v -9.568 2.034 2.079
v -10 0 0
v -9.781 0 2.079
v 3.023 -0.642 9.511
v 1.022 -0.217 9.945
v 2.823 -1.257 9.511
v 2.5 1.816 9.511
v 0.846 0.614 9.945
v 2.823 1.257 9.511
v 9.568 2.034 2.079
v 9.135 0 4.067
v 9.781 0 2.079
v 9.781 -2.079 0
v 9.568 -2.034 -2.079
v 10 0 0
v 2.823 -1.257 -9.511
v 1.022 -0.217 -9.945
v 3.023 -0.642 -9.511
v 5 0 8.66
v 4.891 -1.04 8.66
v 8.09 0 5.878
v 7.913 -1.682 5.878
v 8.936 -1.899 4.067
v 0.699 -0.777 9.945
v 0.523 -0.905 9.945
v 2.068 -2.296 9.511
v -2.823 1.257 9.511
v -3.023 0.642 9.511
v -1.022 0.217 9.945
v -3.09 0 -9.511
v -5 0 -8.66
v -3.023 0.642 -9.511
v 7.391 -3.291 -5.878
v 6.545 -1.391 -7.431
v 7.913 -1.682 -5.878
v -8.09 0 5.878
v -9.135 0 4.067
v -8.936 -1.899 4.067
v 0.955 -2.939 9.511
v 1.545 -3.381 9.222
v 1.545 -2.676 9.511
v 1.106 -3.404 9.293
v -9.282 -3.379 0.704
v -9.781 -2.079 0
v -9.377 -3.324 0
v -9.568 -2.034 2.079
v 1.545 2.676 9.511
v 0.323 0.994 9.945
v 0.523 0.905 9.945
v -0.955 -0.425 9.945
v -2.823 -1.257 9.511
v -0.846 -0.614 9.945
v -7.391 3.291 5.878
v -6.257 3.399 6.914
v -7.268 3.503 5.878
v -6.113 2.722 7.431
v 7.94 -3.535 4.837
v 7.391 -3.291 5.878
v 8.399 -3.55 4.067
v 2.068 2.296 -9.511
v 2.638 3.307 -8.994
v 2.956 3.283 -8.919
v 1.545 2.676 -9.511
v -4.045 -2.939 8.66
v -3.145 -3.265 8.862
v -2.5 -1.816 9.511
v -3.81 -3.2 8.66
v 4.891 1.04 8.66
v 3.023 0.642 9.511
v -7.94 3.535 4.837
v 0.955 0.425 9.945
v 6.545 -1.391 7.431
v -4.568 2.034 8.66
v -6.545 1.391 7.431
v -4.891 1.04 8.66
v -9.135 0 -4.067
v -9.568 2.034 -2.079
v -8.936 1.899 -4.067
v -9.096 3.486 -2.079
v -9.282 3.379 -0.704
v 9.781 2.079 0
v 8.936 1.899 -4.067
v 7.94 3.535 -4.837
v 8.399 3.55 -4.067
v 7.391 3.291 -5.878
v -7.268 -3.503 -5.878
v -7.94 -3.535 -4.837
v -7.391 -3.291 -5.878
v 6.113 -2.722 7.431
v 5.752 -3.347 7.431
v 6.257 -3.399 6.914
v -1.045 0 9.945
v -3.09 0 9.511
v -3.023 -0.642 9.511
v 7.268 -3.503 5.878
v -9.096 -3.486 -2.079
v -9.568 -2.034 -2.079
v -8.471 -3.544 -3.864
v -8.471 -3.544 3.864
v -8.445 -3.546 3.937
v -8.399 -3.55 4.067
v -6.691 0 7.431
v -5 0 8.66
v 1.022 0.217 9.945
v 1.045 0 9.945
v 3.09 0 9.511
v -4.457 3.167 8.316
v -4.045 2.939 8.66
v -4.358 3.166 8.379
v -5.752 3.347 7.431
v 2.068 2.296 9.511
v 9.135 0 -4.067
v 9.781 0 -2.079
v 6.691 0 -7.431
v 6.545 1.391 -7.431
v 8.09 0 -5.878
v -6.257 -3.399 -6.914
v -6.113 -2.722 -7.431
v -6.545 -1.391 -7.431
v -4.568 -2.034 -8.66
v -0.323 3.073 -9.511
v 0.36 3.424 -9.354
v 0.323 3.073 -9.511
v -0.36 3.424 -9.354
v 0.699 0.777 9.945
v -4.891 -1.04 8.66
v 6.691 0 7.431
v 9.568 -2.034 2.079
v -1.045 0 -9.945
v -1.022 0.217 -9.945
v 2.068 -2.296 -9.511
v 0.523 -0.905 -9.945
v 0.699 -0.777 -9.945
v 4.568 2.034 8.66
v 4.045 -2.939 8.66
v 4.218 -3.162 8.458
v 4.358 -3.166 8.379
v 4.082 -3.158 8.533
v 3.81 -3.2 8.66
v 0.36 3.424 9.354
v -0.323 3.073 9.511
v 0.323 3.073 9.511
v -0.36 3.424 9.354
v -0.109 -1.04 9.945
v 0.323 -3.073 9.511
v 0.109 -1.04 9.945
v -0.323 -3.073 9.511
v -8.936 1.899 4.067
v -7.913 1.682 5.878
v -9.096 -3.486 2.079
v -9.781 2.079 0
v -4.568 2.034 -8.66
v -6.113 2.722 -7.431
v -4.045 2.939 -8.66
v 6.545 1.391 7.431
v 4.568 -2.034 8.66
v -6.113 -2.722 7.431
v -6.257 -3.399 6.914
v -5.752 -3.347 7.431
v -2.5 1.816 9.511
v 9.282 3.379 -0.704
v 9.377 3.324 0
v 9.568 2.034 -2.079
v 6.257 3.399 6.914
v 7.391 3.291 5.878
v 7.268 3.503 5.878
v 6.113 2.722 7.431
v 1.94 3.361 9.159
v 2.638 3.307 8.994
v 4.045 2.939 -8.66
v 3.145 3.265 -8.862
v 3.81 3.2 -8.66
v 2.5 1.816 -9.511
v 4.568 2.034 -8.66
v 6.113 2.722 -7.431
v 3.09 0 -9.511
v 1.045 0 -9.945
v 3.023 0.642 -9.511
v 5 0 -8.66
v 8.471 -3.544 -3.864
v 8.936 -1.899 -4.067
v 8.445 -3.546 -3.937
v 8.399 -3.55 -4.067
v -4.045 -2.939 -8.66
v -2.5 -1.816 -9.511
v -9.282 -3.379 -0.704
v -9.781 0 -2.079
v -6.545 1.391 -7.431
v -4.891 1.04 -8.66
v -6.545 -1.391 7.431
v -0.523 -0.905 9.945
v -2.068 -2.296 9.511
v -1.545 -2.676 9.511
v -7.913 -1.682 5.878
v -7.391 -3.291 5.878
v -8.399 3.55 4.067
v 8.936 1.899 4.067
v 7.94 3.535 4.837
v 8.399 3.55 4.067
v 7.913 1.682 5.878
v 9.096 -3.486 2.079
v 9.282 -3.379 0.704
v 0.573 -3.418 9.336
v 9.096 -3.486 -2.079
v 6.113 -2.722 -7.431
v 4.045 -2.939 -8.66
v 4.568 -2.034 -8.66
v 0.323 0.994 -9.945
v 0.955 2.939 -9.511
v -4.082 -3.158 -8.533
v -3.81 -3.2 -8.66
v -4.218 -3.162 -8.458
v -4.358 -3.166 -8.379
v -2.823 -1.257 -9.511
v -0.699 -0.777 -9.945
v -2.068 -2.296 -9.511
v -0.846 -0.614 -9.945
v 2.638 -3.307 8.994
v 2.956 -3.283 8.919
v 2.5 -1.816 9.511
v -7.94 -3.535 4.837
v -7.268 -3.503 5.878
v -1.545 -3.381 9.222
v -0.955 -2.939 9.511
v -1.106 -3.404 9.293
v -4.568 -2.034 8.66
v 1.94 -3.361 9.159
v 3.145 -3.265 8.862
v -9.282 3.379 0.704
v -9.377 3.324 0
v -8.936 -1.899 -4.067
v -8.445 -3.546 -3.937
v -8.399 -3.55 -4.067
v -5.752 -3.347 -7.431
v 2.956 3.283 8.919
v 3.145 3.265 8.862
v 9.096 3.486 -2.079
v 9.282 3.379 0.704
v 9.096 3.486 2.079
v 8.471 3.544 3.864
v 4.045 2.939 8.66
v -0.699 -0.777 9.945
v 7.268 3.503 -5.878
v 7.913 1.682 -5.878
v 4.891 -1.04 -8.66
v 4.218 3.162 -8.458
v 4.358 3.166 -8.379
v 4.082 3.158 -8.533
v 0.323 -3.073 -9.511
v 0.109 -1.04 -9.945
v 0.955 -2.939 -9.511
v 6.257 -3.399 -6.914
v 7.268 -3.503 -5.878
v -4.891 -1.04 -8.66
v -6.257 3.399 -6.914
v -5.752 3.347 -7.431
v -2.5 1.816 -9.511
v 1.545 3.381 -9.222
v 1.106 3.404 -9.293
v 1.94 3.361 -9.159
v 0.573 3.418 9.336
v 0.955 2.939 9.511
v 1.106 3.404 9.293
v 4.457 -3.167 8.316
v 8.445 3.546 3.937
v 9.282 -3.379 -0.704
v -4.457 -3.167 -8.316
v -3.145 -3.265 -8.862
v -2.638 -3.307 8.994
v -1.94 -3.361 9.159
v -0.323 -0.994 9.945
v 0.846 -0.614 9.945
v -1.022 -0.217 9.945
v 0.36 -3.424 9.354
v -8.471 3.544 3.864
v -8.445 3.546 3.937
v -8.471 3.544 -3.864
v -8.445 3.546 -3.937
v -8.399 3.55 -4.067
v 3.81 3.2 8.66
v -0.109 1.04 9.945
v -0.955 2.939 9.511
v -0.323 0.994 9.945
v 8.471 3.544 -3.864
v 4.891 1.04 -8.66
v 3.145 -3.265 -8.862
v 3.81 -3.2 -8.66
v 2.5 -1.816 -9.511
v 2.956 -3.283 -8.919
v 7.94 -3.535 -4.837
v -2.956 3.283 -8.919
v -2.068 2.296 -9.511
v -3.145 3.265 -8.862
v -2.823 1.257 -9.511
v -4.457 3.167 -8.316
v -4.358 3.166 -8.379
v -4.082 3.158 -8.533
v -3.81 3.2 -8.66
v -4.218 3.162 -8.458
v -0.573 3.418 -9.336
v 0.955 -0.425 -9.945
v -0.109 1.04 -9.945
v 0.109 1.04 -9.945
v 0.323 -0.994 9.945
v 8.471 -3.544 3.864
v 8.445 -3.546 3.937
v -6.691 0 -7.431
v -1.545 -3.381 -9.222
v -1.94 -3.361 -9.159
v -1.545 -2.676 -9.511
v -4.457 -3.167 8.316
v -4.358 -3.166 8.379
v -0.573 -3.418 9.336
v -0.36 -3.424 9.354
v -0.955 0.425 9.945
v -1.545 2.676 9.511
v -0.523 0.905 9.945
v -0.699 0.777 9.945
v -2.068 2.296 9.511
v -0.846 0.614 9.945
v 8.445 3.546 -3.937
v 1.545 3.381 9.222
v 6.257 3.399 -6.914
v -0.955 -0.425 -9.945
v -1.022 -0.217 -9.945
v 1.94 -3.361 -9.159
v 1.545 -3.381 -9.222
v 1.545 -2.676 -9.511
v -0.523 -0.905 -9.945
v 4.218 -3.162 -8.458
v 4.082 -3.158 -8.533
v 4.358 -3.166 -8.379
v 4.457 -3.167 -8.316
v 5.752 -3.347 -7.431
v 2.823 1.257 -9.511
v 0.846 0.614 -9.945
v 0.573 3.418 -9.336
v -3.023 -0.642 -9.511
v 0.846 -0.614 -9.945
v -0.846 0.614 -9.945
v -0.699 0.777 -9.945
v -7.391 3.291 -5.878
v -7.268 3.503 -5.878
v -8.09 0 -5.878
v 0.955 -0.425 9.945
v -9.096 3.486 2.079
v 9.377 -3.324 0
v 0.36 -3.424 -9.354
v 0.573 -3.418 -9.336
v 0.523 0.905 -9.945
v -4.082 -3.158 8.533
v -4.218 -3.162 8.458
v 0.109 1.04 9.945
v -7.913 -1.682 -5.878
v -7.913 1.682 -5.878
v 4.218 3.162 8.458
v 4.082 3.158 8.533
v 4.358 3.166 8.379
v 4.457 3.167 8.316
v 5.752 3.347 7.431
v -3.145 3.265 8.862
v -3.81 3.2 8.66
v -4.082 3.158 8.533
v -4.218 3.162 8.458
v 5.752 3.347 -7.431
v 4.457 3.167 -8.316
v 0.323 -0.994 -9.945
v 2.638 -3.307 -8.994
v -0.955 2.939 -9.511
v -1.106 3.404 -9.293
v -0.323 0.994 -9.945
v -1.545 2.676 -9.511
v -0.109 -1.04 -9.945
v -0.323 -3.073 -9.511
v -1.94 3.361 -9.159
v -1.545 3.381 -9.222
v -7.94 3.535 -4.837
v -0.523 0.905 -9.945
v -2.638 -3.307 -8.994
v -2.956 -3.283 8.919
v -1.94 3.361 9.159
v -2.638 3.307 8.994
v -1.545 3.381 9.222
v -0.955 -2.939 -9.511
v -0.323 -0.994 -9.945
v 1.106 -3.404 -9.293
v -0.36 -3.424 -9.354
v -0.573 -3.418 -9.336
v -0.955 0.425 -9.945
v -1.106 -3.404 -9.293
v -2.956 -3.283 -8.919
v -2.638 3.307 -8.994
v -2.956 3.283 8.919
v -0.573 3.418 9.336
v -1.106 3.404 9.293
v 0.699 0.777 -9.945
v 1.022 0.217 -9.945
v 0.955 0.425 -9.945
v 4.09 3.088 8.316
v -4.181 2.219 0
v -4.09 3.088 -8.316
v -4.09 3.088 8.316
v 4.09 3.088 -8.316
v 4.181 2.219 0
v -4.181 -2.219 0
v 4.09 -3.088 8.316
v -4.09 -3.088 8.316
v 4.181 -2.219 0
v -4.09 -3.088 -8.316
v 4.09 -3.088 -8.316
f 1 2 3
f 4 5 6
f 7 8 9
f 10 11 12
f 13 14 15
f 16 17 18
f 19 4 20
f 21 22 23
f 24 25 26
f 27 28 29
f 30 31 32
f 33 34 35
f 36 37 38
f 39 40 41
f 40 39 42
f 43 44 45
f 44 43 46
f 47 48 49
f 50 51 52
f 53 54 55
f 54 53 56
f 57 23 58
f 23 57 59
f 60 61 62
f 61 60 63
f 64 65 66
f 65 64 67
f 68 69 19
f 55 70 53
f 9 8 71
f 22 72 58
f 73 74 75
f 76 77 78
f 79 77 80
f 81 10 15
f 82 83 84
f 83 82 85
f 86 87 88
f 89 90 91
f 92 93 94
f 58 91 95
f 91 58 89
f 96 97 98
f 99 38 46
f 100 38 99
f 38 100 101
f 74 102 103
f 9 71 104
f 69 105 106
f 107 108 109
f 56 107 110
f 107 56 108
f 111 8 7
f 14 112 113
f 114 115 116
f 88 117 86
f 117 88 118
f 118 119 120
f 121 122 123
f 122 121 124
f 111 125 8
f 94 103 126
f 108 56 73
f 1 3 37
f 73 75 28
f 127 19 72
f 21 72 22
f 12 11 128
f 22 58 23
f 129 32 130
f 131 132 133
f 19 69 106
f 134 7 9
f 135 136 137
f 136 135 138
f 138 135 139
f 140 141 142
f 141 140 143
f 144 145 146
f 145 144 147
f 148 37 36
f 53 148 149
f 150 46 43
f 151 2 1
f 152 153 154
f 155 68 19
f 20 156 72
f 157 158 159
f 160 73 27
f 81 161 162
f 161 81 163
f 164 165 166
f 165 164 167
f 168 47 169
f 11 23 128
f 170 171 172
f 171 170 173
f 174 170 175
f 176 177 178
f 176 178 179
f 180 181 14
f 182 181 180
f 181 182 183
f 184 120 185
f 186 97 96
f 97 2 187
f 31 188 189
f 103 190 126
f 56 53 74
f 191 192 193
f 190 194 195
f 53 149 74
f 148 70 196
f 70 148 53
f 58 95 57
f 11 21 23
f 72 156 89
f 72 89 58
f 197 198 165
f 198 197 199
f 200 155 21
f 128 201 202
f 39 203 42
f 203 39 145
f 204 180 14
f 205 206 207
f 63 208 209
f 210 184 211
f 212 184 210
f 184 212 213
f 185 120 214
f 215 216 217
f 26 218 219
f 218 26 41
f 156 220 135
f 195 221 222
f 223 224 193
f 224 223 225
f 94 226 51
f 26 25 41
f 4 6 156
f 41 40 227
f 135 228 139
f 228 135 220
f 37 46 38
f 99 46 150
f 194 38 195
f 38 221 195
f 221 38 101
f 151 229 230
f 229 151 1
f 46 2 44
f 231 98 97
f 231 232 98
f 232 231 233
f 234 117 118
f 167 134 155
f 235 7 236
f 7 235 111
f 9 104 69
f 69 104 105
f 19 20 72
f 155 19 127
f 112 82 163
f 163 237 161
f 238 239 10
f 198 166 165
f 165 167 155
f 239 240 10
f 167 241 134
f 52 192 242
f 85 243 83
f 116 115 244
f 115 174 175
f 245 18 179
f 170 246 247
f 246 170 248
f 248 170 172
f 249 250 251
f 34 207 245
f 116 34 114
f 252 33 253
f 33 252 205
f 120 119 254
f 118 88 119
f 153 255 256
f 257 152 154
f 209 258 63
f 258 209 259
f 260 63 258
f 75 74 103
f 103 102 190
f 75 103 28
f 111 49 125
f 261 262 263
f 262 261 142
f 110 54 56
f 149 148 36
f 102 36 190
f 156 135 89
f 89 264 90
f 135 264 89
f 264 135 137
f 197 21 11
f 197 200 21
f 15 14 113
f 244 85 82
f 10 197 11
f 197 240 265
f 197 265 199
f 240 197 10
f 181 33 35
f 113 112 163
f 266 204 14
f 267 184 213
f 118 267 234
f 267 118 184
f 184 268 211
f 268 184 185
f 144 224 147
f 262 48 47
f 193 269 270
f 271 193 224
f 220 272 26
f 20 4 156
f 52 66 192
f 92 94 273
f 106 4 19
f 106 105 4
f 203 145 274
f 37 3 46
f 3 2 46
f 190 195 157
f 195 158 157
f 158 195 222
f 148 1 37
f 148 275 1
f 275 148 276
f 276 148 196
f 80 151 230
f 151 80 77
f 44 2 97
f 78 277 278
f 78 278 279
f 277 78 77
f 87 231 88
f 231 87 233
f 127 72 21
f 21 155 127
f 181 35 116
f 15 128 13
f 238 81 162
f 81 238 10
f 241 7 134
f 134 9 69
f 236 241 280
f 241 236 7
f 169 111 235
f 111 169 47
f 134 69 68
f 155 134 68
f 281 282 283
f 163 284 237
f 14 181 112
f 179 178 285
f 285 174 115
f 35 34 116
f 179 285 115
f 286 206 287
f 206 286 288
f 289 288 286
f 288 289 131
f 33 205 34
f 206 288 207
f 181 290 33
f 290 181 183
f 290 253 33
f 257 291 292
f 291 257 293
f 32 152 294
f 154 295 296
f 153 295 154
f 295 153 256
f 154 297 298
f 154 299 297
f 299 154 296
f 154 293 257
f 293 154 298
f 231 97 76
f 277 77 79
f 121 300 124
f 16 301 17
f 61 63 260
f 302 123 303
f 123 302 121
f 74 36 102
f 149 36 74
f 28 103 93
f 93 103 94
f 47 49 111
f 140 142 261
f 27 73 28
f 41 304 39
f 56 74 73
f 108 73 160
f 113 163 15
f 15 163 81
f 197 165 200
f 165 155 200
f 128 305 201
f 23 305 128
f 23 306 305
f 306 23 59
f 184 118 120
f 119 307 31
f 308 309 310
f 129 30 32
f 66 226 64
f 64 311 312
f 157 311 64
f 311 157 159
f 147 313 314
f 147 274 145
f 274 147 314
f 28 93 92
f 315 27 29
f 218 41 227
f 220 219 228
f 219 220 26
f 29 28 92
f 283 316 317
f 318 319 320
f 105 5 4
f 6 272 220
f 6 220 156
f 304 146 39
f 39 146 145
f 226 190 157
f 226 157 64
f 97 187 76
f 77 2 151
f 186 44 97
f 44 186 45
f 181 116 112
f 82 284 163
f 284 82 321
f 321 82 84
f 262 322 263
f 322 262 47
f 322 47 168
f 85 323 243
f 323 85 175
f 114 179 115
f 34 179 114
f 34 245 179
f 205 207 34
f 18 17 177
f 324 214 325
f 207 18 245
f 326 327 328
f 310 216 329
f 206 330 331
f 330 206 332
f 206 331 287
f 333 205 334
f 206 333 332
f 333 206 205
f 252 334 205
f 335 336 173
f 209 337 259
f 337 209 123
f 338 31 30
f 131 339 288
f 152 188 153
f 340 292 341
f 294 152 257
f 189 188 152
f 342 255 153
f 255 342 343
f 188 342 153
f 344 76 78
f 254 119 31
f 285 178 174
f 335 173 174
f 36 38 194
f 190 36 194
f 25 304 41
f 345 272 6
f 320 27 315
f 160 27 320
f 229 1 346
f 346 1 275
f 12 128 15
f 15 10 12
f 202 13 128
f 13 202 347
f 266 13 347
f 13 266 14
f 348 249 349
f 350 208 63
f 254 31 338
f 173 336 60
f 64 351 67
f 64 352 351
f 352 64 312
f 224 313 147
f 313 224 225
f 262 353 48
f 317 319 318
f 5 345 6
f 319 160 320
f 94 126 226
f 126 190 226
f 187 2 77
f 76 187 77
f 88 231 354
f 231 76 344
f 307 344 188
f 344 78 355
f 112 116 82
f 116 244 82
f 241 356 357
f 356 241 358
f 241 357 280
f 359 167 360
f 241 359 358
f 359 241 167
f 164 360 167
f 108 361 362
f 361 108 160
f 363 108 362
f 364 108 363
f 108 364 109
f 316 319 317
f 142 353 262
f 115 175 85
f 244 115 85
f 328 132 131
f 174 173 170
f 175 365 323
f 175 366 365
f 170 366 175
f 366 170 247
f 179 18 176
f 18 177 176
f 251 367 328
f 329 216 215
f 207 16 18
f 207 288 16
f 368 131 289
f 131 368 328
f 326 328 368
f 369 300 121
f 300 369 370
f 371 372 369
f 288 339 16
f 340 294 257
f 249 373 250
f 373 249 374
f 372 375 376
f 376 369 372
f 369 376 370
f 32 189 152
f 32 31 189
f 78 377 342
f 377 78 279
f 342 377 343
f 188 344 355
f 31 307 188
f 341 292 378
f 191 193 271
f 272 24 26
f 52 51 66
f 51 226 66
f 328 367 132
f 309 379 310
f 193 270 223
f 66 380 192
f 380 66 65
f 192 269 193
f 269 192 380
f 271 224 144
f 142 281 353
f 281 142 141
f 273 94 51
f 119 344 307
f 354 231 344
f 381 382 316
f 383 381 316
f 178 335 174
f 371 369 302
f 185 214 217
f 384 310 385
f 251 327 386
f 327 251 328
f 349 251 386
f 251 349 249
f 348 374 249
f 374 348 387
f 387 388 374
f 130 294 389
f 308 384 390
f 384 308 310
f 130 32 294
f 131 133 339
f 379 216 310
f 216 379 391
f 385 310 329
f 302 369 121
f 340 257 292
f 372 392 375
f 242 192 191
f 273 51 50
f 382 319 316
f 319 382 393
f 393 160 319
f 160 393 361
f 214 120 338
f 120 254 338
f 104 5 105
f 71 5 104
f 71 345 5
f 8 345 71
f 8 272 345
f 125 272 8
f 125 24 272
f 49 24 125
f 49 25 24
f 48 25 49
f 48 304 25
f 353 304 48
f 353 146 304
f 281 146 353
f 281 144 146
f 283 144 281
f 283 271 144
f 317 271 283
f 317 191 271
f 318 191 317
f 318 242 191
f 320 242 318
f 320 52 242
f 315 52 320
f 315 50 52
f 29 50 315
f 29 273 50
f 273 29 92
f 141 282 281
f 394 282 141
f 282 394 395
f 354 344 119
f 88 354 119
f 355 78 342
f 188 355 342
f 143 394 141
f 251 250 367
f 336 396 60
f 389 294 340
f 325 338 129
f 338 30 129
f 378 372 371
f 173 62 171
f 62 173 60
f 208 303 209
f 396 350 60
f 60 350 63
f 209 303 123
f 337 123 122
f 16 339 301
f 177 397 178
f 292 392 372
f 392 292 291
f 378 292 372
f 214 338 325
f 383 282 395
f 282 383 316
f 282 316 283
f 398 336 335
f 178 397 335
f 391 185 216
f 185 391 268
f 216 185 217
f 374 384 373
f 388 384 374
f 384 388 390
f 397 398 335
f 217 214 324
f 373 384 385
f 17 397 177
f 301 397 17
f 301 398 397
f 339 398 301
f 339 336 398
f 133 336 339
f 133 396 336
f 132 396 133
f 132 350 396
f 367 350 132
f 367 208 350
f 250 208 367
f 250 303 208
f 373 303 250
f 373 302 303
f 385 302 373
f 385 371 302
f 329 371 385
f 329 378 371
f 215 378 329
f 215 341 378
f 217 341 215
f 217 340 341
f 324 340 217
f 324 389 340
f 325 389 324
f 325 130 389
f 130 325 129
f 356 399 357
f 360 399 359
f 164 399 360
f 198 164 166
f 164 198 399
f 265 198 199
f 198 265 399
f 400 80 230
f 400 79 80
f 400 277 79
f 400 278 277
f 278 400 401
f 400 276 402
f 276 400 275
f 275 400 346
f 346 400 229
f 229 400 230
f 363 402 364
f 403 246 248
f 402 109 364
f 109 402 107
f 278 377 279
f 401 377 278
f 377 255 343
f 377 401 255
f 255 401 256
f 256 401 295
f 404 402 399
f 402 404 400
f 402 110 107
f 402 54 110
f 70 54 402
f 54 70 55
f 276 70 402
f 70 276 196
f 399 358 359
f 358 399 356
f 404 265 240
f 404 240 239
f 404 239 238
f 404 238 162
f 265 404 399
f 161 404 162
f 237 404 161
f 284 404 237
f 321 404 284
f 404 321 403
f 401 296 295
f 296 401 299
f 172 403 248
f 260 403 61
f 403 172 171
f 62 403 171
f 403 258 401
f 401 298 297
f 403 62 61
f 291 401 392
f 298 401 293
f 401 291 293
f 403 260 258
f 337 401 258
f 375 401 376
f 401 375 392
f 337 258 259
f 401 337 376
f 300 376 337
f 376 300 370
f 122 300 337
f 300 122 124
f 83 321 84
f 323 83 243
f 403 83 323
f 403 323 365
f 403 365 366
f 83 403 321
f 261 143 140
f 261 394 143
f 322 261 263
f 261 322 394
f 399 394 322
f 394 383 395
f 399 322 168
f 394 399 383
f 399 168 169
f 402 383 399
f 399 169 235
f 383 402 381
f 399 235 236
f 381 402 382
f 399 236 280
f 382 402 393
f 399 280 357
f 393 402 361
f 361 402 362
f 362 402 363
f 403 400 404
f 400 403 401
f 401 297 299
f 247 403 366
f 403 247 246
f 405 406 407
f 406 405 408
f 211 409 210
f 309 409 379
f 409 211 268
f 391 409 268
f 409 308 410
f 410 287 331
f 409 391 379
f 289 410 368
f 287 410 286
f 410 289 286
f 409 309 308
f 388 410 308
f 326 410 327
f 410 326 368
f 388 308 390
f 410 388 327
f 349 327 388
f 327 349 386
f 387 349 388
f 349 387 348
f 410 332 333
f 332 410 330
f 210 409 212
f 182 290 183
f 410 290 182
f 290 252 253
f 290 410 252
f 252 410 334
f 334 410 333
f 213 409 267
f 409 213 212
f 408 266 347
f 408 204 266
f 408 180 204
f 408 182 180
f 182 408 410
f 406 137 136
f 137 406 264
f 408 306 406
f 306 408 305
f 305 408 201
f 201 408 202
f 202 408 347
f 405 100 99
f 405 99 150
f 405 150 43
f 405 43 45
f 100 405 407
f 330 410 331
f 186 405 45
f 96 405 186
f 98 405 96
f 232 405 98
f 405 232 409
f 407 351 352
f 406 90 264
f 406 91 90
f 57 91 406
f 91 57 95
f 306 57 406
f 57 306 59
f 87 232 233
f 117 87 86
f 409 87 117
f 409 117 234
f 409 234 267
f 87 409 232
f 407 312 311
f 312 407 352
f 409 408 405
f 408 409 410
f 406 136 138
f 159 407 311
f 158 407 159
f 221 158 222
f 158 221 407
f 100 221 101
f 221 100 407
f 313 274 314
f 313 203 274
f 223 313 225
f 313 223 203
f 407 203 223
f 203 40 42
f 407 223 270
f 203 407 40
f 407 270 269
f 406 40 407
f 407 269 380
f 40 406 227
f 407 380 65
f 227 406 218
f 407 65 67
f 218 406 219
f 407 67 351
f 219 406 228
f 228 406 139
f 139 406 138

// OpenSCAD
wheel_radius = 10;
side_spheres_radius = wheel_radius*4;
hub_thickness = 4;

difference() {
    sphere(r=wheel_radius);
    translate([0,side_spheres_radius+hub_thickness/2,0])
        sphere(r=side_spheres_radius);
    translate([0,-(side_spheres_radius+hub_thickness/2),0])
        sphere(r=side_spheres_radius);
}
